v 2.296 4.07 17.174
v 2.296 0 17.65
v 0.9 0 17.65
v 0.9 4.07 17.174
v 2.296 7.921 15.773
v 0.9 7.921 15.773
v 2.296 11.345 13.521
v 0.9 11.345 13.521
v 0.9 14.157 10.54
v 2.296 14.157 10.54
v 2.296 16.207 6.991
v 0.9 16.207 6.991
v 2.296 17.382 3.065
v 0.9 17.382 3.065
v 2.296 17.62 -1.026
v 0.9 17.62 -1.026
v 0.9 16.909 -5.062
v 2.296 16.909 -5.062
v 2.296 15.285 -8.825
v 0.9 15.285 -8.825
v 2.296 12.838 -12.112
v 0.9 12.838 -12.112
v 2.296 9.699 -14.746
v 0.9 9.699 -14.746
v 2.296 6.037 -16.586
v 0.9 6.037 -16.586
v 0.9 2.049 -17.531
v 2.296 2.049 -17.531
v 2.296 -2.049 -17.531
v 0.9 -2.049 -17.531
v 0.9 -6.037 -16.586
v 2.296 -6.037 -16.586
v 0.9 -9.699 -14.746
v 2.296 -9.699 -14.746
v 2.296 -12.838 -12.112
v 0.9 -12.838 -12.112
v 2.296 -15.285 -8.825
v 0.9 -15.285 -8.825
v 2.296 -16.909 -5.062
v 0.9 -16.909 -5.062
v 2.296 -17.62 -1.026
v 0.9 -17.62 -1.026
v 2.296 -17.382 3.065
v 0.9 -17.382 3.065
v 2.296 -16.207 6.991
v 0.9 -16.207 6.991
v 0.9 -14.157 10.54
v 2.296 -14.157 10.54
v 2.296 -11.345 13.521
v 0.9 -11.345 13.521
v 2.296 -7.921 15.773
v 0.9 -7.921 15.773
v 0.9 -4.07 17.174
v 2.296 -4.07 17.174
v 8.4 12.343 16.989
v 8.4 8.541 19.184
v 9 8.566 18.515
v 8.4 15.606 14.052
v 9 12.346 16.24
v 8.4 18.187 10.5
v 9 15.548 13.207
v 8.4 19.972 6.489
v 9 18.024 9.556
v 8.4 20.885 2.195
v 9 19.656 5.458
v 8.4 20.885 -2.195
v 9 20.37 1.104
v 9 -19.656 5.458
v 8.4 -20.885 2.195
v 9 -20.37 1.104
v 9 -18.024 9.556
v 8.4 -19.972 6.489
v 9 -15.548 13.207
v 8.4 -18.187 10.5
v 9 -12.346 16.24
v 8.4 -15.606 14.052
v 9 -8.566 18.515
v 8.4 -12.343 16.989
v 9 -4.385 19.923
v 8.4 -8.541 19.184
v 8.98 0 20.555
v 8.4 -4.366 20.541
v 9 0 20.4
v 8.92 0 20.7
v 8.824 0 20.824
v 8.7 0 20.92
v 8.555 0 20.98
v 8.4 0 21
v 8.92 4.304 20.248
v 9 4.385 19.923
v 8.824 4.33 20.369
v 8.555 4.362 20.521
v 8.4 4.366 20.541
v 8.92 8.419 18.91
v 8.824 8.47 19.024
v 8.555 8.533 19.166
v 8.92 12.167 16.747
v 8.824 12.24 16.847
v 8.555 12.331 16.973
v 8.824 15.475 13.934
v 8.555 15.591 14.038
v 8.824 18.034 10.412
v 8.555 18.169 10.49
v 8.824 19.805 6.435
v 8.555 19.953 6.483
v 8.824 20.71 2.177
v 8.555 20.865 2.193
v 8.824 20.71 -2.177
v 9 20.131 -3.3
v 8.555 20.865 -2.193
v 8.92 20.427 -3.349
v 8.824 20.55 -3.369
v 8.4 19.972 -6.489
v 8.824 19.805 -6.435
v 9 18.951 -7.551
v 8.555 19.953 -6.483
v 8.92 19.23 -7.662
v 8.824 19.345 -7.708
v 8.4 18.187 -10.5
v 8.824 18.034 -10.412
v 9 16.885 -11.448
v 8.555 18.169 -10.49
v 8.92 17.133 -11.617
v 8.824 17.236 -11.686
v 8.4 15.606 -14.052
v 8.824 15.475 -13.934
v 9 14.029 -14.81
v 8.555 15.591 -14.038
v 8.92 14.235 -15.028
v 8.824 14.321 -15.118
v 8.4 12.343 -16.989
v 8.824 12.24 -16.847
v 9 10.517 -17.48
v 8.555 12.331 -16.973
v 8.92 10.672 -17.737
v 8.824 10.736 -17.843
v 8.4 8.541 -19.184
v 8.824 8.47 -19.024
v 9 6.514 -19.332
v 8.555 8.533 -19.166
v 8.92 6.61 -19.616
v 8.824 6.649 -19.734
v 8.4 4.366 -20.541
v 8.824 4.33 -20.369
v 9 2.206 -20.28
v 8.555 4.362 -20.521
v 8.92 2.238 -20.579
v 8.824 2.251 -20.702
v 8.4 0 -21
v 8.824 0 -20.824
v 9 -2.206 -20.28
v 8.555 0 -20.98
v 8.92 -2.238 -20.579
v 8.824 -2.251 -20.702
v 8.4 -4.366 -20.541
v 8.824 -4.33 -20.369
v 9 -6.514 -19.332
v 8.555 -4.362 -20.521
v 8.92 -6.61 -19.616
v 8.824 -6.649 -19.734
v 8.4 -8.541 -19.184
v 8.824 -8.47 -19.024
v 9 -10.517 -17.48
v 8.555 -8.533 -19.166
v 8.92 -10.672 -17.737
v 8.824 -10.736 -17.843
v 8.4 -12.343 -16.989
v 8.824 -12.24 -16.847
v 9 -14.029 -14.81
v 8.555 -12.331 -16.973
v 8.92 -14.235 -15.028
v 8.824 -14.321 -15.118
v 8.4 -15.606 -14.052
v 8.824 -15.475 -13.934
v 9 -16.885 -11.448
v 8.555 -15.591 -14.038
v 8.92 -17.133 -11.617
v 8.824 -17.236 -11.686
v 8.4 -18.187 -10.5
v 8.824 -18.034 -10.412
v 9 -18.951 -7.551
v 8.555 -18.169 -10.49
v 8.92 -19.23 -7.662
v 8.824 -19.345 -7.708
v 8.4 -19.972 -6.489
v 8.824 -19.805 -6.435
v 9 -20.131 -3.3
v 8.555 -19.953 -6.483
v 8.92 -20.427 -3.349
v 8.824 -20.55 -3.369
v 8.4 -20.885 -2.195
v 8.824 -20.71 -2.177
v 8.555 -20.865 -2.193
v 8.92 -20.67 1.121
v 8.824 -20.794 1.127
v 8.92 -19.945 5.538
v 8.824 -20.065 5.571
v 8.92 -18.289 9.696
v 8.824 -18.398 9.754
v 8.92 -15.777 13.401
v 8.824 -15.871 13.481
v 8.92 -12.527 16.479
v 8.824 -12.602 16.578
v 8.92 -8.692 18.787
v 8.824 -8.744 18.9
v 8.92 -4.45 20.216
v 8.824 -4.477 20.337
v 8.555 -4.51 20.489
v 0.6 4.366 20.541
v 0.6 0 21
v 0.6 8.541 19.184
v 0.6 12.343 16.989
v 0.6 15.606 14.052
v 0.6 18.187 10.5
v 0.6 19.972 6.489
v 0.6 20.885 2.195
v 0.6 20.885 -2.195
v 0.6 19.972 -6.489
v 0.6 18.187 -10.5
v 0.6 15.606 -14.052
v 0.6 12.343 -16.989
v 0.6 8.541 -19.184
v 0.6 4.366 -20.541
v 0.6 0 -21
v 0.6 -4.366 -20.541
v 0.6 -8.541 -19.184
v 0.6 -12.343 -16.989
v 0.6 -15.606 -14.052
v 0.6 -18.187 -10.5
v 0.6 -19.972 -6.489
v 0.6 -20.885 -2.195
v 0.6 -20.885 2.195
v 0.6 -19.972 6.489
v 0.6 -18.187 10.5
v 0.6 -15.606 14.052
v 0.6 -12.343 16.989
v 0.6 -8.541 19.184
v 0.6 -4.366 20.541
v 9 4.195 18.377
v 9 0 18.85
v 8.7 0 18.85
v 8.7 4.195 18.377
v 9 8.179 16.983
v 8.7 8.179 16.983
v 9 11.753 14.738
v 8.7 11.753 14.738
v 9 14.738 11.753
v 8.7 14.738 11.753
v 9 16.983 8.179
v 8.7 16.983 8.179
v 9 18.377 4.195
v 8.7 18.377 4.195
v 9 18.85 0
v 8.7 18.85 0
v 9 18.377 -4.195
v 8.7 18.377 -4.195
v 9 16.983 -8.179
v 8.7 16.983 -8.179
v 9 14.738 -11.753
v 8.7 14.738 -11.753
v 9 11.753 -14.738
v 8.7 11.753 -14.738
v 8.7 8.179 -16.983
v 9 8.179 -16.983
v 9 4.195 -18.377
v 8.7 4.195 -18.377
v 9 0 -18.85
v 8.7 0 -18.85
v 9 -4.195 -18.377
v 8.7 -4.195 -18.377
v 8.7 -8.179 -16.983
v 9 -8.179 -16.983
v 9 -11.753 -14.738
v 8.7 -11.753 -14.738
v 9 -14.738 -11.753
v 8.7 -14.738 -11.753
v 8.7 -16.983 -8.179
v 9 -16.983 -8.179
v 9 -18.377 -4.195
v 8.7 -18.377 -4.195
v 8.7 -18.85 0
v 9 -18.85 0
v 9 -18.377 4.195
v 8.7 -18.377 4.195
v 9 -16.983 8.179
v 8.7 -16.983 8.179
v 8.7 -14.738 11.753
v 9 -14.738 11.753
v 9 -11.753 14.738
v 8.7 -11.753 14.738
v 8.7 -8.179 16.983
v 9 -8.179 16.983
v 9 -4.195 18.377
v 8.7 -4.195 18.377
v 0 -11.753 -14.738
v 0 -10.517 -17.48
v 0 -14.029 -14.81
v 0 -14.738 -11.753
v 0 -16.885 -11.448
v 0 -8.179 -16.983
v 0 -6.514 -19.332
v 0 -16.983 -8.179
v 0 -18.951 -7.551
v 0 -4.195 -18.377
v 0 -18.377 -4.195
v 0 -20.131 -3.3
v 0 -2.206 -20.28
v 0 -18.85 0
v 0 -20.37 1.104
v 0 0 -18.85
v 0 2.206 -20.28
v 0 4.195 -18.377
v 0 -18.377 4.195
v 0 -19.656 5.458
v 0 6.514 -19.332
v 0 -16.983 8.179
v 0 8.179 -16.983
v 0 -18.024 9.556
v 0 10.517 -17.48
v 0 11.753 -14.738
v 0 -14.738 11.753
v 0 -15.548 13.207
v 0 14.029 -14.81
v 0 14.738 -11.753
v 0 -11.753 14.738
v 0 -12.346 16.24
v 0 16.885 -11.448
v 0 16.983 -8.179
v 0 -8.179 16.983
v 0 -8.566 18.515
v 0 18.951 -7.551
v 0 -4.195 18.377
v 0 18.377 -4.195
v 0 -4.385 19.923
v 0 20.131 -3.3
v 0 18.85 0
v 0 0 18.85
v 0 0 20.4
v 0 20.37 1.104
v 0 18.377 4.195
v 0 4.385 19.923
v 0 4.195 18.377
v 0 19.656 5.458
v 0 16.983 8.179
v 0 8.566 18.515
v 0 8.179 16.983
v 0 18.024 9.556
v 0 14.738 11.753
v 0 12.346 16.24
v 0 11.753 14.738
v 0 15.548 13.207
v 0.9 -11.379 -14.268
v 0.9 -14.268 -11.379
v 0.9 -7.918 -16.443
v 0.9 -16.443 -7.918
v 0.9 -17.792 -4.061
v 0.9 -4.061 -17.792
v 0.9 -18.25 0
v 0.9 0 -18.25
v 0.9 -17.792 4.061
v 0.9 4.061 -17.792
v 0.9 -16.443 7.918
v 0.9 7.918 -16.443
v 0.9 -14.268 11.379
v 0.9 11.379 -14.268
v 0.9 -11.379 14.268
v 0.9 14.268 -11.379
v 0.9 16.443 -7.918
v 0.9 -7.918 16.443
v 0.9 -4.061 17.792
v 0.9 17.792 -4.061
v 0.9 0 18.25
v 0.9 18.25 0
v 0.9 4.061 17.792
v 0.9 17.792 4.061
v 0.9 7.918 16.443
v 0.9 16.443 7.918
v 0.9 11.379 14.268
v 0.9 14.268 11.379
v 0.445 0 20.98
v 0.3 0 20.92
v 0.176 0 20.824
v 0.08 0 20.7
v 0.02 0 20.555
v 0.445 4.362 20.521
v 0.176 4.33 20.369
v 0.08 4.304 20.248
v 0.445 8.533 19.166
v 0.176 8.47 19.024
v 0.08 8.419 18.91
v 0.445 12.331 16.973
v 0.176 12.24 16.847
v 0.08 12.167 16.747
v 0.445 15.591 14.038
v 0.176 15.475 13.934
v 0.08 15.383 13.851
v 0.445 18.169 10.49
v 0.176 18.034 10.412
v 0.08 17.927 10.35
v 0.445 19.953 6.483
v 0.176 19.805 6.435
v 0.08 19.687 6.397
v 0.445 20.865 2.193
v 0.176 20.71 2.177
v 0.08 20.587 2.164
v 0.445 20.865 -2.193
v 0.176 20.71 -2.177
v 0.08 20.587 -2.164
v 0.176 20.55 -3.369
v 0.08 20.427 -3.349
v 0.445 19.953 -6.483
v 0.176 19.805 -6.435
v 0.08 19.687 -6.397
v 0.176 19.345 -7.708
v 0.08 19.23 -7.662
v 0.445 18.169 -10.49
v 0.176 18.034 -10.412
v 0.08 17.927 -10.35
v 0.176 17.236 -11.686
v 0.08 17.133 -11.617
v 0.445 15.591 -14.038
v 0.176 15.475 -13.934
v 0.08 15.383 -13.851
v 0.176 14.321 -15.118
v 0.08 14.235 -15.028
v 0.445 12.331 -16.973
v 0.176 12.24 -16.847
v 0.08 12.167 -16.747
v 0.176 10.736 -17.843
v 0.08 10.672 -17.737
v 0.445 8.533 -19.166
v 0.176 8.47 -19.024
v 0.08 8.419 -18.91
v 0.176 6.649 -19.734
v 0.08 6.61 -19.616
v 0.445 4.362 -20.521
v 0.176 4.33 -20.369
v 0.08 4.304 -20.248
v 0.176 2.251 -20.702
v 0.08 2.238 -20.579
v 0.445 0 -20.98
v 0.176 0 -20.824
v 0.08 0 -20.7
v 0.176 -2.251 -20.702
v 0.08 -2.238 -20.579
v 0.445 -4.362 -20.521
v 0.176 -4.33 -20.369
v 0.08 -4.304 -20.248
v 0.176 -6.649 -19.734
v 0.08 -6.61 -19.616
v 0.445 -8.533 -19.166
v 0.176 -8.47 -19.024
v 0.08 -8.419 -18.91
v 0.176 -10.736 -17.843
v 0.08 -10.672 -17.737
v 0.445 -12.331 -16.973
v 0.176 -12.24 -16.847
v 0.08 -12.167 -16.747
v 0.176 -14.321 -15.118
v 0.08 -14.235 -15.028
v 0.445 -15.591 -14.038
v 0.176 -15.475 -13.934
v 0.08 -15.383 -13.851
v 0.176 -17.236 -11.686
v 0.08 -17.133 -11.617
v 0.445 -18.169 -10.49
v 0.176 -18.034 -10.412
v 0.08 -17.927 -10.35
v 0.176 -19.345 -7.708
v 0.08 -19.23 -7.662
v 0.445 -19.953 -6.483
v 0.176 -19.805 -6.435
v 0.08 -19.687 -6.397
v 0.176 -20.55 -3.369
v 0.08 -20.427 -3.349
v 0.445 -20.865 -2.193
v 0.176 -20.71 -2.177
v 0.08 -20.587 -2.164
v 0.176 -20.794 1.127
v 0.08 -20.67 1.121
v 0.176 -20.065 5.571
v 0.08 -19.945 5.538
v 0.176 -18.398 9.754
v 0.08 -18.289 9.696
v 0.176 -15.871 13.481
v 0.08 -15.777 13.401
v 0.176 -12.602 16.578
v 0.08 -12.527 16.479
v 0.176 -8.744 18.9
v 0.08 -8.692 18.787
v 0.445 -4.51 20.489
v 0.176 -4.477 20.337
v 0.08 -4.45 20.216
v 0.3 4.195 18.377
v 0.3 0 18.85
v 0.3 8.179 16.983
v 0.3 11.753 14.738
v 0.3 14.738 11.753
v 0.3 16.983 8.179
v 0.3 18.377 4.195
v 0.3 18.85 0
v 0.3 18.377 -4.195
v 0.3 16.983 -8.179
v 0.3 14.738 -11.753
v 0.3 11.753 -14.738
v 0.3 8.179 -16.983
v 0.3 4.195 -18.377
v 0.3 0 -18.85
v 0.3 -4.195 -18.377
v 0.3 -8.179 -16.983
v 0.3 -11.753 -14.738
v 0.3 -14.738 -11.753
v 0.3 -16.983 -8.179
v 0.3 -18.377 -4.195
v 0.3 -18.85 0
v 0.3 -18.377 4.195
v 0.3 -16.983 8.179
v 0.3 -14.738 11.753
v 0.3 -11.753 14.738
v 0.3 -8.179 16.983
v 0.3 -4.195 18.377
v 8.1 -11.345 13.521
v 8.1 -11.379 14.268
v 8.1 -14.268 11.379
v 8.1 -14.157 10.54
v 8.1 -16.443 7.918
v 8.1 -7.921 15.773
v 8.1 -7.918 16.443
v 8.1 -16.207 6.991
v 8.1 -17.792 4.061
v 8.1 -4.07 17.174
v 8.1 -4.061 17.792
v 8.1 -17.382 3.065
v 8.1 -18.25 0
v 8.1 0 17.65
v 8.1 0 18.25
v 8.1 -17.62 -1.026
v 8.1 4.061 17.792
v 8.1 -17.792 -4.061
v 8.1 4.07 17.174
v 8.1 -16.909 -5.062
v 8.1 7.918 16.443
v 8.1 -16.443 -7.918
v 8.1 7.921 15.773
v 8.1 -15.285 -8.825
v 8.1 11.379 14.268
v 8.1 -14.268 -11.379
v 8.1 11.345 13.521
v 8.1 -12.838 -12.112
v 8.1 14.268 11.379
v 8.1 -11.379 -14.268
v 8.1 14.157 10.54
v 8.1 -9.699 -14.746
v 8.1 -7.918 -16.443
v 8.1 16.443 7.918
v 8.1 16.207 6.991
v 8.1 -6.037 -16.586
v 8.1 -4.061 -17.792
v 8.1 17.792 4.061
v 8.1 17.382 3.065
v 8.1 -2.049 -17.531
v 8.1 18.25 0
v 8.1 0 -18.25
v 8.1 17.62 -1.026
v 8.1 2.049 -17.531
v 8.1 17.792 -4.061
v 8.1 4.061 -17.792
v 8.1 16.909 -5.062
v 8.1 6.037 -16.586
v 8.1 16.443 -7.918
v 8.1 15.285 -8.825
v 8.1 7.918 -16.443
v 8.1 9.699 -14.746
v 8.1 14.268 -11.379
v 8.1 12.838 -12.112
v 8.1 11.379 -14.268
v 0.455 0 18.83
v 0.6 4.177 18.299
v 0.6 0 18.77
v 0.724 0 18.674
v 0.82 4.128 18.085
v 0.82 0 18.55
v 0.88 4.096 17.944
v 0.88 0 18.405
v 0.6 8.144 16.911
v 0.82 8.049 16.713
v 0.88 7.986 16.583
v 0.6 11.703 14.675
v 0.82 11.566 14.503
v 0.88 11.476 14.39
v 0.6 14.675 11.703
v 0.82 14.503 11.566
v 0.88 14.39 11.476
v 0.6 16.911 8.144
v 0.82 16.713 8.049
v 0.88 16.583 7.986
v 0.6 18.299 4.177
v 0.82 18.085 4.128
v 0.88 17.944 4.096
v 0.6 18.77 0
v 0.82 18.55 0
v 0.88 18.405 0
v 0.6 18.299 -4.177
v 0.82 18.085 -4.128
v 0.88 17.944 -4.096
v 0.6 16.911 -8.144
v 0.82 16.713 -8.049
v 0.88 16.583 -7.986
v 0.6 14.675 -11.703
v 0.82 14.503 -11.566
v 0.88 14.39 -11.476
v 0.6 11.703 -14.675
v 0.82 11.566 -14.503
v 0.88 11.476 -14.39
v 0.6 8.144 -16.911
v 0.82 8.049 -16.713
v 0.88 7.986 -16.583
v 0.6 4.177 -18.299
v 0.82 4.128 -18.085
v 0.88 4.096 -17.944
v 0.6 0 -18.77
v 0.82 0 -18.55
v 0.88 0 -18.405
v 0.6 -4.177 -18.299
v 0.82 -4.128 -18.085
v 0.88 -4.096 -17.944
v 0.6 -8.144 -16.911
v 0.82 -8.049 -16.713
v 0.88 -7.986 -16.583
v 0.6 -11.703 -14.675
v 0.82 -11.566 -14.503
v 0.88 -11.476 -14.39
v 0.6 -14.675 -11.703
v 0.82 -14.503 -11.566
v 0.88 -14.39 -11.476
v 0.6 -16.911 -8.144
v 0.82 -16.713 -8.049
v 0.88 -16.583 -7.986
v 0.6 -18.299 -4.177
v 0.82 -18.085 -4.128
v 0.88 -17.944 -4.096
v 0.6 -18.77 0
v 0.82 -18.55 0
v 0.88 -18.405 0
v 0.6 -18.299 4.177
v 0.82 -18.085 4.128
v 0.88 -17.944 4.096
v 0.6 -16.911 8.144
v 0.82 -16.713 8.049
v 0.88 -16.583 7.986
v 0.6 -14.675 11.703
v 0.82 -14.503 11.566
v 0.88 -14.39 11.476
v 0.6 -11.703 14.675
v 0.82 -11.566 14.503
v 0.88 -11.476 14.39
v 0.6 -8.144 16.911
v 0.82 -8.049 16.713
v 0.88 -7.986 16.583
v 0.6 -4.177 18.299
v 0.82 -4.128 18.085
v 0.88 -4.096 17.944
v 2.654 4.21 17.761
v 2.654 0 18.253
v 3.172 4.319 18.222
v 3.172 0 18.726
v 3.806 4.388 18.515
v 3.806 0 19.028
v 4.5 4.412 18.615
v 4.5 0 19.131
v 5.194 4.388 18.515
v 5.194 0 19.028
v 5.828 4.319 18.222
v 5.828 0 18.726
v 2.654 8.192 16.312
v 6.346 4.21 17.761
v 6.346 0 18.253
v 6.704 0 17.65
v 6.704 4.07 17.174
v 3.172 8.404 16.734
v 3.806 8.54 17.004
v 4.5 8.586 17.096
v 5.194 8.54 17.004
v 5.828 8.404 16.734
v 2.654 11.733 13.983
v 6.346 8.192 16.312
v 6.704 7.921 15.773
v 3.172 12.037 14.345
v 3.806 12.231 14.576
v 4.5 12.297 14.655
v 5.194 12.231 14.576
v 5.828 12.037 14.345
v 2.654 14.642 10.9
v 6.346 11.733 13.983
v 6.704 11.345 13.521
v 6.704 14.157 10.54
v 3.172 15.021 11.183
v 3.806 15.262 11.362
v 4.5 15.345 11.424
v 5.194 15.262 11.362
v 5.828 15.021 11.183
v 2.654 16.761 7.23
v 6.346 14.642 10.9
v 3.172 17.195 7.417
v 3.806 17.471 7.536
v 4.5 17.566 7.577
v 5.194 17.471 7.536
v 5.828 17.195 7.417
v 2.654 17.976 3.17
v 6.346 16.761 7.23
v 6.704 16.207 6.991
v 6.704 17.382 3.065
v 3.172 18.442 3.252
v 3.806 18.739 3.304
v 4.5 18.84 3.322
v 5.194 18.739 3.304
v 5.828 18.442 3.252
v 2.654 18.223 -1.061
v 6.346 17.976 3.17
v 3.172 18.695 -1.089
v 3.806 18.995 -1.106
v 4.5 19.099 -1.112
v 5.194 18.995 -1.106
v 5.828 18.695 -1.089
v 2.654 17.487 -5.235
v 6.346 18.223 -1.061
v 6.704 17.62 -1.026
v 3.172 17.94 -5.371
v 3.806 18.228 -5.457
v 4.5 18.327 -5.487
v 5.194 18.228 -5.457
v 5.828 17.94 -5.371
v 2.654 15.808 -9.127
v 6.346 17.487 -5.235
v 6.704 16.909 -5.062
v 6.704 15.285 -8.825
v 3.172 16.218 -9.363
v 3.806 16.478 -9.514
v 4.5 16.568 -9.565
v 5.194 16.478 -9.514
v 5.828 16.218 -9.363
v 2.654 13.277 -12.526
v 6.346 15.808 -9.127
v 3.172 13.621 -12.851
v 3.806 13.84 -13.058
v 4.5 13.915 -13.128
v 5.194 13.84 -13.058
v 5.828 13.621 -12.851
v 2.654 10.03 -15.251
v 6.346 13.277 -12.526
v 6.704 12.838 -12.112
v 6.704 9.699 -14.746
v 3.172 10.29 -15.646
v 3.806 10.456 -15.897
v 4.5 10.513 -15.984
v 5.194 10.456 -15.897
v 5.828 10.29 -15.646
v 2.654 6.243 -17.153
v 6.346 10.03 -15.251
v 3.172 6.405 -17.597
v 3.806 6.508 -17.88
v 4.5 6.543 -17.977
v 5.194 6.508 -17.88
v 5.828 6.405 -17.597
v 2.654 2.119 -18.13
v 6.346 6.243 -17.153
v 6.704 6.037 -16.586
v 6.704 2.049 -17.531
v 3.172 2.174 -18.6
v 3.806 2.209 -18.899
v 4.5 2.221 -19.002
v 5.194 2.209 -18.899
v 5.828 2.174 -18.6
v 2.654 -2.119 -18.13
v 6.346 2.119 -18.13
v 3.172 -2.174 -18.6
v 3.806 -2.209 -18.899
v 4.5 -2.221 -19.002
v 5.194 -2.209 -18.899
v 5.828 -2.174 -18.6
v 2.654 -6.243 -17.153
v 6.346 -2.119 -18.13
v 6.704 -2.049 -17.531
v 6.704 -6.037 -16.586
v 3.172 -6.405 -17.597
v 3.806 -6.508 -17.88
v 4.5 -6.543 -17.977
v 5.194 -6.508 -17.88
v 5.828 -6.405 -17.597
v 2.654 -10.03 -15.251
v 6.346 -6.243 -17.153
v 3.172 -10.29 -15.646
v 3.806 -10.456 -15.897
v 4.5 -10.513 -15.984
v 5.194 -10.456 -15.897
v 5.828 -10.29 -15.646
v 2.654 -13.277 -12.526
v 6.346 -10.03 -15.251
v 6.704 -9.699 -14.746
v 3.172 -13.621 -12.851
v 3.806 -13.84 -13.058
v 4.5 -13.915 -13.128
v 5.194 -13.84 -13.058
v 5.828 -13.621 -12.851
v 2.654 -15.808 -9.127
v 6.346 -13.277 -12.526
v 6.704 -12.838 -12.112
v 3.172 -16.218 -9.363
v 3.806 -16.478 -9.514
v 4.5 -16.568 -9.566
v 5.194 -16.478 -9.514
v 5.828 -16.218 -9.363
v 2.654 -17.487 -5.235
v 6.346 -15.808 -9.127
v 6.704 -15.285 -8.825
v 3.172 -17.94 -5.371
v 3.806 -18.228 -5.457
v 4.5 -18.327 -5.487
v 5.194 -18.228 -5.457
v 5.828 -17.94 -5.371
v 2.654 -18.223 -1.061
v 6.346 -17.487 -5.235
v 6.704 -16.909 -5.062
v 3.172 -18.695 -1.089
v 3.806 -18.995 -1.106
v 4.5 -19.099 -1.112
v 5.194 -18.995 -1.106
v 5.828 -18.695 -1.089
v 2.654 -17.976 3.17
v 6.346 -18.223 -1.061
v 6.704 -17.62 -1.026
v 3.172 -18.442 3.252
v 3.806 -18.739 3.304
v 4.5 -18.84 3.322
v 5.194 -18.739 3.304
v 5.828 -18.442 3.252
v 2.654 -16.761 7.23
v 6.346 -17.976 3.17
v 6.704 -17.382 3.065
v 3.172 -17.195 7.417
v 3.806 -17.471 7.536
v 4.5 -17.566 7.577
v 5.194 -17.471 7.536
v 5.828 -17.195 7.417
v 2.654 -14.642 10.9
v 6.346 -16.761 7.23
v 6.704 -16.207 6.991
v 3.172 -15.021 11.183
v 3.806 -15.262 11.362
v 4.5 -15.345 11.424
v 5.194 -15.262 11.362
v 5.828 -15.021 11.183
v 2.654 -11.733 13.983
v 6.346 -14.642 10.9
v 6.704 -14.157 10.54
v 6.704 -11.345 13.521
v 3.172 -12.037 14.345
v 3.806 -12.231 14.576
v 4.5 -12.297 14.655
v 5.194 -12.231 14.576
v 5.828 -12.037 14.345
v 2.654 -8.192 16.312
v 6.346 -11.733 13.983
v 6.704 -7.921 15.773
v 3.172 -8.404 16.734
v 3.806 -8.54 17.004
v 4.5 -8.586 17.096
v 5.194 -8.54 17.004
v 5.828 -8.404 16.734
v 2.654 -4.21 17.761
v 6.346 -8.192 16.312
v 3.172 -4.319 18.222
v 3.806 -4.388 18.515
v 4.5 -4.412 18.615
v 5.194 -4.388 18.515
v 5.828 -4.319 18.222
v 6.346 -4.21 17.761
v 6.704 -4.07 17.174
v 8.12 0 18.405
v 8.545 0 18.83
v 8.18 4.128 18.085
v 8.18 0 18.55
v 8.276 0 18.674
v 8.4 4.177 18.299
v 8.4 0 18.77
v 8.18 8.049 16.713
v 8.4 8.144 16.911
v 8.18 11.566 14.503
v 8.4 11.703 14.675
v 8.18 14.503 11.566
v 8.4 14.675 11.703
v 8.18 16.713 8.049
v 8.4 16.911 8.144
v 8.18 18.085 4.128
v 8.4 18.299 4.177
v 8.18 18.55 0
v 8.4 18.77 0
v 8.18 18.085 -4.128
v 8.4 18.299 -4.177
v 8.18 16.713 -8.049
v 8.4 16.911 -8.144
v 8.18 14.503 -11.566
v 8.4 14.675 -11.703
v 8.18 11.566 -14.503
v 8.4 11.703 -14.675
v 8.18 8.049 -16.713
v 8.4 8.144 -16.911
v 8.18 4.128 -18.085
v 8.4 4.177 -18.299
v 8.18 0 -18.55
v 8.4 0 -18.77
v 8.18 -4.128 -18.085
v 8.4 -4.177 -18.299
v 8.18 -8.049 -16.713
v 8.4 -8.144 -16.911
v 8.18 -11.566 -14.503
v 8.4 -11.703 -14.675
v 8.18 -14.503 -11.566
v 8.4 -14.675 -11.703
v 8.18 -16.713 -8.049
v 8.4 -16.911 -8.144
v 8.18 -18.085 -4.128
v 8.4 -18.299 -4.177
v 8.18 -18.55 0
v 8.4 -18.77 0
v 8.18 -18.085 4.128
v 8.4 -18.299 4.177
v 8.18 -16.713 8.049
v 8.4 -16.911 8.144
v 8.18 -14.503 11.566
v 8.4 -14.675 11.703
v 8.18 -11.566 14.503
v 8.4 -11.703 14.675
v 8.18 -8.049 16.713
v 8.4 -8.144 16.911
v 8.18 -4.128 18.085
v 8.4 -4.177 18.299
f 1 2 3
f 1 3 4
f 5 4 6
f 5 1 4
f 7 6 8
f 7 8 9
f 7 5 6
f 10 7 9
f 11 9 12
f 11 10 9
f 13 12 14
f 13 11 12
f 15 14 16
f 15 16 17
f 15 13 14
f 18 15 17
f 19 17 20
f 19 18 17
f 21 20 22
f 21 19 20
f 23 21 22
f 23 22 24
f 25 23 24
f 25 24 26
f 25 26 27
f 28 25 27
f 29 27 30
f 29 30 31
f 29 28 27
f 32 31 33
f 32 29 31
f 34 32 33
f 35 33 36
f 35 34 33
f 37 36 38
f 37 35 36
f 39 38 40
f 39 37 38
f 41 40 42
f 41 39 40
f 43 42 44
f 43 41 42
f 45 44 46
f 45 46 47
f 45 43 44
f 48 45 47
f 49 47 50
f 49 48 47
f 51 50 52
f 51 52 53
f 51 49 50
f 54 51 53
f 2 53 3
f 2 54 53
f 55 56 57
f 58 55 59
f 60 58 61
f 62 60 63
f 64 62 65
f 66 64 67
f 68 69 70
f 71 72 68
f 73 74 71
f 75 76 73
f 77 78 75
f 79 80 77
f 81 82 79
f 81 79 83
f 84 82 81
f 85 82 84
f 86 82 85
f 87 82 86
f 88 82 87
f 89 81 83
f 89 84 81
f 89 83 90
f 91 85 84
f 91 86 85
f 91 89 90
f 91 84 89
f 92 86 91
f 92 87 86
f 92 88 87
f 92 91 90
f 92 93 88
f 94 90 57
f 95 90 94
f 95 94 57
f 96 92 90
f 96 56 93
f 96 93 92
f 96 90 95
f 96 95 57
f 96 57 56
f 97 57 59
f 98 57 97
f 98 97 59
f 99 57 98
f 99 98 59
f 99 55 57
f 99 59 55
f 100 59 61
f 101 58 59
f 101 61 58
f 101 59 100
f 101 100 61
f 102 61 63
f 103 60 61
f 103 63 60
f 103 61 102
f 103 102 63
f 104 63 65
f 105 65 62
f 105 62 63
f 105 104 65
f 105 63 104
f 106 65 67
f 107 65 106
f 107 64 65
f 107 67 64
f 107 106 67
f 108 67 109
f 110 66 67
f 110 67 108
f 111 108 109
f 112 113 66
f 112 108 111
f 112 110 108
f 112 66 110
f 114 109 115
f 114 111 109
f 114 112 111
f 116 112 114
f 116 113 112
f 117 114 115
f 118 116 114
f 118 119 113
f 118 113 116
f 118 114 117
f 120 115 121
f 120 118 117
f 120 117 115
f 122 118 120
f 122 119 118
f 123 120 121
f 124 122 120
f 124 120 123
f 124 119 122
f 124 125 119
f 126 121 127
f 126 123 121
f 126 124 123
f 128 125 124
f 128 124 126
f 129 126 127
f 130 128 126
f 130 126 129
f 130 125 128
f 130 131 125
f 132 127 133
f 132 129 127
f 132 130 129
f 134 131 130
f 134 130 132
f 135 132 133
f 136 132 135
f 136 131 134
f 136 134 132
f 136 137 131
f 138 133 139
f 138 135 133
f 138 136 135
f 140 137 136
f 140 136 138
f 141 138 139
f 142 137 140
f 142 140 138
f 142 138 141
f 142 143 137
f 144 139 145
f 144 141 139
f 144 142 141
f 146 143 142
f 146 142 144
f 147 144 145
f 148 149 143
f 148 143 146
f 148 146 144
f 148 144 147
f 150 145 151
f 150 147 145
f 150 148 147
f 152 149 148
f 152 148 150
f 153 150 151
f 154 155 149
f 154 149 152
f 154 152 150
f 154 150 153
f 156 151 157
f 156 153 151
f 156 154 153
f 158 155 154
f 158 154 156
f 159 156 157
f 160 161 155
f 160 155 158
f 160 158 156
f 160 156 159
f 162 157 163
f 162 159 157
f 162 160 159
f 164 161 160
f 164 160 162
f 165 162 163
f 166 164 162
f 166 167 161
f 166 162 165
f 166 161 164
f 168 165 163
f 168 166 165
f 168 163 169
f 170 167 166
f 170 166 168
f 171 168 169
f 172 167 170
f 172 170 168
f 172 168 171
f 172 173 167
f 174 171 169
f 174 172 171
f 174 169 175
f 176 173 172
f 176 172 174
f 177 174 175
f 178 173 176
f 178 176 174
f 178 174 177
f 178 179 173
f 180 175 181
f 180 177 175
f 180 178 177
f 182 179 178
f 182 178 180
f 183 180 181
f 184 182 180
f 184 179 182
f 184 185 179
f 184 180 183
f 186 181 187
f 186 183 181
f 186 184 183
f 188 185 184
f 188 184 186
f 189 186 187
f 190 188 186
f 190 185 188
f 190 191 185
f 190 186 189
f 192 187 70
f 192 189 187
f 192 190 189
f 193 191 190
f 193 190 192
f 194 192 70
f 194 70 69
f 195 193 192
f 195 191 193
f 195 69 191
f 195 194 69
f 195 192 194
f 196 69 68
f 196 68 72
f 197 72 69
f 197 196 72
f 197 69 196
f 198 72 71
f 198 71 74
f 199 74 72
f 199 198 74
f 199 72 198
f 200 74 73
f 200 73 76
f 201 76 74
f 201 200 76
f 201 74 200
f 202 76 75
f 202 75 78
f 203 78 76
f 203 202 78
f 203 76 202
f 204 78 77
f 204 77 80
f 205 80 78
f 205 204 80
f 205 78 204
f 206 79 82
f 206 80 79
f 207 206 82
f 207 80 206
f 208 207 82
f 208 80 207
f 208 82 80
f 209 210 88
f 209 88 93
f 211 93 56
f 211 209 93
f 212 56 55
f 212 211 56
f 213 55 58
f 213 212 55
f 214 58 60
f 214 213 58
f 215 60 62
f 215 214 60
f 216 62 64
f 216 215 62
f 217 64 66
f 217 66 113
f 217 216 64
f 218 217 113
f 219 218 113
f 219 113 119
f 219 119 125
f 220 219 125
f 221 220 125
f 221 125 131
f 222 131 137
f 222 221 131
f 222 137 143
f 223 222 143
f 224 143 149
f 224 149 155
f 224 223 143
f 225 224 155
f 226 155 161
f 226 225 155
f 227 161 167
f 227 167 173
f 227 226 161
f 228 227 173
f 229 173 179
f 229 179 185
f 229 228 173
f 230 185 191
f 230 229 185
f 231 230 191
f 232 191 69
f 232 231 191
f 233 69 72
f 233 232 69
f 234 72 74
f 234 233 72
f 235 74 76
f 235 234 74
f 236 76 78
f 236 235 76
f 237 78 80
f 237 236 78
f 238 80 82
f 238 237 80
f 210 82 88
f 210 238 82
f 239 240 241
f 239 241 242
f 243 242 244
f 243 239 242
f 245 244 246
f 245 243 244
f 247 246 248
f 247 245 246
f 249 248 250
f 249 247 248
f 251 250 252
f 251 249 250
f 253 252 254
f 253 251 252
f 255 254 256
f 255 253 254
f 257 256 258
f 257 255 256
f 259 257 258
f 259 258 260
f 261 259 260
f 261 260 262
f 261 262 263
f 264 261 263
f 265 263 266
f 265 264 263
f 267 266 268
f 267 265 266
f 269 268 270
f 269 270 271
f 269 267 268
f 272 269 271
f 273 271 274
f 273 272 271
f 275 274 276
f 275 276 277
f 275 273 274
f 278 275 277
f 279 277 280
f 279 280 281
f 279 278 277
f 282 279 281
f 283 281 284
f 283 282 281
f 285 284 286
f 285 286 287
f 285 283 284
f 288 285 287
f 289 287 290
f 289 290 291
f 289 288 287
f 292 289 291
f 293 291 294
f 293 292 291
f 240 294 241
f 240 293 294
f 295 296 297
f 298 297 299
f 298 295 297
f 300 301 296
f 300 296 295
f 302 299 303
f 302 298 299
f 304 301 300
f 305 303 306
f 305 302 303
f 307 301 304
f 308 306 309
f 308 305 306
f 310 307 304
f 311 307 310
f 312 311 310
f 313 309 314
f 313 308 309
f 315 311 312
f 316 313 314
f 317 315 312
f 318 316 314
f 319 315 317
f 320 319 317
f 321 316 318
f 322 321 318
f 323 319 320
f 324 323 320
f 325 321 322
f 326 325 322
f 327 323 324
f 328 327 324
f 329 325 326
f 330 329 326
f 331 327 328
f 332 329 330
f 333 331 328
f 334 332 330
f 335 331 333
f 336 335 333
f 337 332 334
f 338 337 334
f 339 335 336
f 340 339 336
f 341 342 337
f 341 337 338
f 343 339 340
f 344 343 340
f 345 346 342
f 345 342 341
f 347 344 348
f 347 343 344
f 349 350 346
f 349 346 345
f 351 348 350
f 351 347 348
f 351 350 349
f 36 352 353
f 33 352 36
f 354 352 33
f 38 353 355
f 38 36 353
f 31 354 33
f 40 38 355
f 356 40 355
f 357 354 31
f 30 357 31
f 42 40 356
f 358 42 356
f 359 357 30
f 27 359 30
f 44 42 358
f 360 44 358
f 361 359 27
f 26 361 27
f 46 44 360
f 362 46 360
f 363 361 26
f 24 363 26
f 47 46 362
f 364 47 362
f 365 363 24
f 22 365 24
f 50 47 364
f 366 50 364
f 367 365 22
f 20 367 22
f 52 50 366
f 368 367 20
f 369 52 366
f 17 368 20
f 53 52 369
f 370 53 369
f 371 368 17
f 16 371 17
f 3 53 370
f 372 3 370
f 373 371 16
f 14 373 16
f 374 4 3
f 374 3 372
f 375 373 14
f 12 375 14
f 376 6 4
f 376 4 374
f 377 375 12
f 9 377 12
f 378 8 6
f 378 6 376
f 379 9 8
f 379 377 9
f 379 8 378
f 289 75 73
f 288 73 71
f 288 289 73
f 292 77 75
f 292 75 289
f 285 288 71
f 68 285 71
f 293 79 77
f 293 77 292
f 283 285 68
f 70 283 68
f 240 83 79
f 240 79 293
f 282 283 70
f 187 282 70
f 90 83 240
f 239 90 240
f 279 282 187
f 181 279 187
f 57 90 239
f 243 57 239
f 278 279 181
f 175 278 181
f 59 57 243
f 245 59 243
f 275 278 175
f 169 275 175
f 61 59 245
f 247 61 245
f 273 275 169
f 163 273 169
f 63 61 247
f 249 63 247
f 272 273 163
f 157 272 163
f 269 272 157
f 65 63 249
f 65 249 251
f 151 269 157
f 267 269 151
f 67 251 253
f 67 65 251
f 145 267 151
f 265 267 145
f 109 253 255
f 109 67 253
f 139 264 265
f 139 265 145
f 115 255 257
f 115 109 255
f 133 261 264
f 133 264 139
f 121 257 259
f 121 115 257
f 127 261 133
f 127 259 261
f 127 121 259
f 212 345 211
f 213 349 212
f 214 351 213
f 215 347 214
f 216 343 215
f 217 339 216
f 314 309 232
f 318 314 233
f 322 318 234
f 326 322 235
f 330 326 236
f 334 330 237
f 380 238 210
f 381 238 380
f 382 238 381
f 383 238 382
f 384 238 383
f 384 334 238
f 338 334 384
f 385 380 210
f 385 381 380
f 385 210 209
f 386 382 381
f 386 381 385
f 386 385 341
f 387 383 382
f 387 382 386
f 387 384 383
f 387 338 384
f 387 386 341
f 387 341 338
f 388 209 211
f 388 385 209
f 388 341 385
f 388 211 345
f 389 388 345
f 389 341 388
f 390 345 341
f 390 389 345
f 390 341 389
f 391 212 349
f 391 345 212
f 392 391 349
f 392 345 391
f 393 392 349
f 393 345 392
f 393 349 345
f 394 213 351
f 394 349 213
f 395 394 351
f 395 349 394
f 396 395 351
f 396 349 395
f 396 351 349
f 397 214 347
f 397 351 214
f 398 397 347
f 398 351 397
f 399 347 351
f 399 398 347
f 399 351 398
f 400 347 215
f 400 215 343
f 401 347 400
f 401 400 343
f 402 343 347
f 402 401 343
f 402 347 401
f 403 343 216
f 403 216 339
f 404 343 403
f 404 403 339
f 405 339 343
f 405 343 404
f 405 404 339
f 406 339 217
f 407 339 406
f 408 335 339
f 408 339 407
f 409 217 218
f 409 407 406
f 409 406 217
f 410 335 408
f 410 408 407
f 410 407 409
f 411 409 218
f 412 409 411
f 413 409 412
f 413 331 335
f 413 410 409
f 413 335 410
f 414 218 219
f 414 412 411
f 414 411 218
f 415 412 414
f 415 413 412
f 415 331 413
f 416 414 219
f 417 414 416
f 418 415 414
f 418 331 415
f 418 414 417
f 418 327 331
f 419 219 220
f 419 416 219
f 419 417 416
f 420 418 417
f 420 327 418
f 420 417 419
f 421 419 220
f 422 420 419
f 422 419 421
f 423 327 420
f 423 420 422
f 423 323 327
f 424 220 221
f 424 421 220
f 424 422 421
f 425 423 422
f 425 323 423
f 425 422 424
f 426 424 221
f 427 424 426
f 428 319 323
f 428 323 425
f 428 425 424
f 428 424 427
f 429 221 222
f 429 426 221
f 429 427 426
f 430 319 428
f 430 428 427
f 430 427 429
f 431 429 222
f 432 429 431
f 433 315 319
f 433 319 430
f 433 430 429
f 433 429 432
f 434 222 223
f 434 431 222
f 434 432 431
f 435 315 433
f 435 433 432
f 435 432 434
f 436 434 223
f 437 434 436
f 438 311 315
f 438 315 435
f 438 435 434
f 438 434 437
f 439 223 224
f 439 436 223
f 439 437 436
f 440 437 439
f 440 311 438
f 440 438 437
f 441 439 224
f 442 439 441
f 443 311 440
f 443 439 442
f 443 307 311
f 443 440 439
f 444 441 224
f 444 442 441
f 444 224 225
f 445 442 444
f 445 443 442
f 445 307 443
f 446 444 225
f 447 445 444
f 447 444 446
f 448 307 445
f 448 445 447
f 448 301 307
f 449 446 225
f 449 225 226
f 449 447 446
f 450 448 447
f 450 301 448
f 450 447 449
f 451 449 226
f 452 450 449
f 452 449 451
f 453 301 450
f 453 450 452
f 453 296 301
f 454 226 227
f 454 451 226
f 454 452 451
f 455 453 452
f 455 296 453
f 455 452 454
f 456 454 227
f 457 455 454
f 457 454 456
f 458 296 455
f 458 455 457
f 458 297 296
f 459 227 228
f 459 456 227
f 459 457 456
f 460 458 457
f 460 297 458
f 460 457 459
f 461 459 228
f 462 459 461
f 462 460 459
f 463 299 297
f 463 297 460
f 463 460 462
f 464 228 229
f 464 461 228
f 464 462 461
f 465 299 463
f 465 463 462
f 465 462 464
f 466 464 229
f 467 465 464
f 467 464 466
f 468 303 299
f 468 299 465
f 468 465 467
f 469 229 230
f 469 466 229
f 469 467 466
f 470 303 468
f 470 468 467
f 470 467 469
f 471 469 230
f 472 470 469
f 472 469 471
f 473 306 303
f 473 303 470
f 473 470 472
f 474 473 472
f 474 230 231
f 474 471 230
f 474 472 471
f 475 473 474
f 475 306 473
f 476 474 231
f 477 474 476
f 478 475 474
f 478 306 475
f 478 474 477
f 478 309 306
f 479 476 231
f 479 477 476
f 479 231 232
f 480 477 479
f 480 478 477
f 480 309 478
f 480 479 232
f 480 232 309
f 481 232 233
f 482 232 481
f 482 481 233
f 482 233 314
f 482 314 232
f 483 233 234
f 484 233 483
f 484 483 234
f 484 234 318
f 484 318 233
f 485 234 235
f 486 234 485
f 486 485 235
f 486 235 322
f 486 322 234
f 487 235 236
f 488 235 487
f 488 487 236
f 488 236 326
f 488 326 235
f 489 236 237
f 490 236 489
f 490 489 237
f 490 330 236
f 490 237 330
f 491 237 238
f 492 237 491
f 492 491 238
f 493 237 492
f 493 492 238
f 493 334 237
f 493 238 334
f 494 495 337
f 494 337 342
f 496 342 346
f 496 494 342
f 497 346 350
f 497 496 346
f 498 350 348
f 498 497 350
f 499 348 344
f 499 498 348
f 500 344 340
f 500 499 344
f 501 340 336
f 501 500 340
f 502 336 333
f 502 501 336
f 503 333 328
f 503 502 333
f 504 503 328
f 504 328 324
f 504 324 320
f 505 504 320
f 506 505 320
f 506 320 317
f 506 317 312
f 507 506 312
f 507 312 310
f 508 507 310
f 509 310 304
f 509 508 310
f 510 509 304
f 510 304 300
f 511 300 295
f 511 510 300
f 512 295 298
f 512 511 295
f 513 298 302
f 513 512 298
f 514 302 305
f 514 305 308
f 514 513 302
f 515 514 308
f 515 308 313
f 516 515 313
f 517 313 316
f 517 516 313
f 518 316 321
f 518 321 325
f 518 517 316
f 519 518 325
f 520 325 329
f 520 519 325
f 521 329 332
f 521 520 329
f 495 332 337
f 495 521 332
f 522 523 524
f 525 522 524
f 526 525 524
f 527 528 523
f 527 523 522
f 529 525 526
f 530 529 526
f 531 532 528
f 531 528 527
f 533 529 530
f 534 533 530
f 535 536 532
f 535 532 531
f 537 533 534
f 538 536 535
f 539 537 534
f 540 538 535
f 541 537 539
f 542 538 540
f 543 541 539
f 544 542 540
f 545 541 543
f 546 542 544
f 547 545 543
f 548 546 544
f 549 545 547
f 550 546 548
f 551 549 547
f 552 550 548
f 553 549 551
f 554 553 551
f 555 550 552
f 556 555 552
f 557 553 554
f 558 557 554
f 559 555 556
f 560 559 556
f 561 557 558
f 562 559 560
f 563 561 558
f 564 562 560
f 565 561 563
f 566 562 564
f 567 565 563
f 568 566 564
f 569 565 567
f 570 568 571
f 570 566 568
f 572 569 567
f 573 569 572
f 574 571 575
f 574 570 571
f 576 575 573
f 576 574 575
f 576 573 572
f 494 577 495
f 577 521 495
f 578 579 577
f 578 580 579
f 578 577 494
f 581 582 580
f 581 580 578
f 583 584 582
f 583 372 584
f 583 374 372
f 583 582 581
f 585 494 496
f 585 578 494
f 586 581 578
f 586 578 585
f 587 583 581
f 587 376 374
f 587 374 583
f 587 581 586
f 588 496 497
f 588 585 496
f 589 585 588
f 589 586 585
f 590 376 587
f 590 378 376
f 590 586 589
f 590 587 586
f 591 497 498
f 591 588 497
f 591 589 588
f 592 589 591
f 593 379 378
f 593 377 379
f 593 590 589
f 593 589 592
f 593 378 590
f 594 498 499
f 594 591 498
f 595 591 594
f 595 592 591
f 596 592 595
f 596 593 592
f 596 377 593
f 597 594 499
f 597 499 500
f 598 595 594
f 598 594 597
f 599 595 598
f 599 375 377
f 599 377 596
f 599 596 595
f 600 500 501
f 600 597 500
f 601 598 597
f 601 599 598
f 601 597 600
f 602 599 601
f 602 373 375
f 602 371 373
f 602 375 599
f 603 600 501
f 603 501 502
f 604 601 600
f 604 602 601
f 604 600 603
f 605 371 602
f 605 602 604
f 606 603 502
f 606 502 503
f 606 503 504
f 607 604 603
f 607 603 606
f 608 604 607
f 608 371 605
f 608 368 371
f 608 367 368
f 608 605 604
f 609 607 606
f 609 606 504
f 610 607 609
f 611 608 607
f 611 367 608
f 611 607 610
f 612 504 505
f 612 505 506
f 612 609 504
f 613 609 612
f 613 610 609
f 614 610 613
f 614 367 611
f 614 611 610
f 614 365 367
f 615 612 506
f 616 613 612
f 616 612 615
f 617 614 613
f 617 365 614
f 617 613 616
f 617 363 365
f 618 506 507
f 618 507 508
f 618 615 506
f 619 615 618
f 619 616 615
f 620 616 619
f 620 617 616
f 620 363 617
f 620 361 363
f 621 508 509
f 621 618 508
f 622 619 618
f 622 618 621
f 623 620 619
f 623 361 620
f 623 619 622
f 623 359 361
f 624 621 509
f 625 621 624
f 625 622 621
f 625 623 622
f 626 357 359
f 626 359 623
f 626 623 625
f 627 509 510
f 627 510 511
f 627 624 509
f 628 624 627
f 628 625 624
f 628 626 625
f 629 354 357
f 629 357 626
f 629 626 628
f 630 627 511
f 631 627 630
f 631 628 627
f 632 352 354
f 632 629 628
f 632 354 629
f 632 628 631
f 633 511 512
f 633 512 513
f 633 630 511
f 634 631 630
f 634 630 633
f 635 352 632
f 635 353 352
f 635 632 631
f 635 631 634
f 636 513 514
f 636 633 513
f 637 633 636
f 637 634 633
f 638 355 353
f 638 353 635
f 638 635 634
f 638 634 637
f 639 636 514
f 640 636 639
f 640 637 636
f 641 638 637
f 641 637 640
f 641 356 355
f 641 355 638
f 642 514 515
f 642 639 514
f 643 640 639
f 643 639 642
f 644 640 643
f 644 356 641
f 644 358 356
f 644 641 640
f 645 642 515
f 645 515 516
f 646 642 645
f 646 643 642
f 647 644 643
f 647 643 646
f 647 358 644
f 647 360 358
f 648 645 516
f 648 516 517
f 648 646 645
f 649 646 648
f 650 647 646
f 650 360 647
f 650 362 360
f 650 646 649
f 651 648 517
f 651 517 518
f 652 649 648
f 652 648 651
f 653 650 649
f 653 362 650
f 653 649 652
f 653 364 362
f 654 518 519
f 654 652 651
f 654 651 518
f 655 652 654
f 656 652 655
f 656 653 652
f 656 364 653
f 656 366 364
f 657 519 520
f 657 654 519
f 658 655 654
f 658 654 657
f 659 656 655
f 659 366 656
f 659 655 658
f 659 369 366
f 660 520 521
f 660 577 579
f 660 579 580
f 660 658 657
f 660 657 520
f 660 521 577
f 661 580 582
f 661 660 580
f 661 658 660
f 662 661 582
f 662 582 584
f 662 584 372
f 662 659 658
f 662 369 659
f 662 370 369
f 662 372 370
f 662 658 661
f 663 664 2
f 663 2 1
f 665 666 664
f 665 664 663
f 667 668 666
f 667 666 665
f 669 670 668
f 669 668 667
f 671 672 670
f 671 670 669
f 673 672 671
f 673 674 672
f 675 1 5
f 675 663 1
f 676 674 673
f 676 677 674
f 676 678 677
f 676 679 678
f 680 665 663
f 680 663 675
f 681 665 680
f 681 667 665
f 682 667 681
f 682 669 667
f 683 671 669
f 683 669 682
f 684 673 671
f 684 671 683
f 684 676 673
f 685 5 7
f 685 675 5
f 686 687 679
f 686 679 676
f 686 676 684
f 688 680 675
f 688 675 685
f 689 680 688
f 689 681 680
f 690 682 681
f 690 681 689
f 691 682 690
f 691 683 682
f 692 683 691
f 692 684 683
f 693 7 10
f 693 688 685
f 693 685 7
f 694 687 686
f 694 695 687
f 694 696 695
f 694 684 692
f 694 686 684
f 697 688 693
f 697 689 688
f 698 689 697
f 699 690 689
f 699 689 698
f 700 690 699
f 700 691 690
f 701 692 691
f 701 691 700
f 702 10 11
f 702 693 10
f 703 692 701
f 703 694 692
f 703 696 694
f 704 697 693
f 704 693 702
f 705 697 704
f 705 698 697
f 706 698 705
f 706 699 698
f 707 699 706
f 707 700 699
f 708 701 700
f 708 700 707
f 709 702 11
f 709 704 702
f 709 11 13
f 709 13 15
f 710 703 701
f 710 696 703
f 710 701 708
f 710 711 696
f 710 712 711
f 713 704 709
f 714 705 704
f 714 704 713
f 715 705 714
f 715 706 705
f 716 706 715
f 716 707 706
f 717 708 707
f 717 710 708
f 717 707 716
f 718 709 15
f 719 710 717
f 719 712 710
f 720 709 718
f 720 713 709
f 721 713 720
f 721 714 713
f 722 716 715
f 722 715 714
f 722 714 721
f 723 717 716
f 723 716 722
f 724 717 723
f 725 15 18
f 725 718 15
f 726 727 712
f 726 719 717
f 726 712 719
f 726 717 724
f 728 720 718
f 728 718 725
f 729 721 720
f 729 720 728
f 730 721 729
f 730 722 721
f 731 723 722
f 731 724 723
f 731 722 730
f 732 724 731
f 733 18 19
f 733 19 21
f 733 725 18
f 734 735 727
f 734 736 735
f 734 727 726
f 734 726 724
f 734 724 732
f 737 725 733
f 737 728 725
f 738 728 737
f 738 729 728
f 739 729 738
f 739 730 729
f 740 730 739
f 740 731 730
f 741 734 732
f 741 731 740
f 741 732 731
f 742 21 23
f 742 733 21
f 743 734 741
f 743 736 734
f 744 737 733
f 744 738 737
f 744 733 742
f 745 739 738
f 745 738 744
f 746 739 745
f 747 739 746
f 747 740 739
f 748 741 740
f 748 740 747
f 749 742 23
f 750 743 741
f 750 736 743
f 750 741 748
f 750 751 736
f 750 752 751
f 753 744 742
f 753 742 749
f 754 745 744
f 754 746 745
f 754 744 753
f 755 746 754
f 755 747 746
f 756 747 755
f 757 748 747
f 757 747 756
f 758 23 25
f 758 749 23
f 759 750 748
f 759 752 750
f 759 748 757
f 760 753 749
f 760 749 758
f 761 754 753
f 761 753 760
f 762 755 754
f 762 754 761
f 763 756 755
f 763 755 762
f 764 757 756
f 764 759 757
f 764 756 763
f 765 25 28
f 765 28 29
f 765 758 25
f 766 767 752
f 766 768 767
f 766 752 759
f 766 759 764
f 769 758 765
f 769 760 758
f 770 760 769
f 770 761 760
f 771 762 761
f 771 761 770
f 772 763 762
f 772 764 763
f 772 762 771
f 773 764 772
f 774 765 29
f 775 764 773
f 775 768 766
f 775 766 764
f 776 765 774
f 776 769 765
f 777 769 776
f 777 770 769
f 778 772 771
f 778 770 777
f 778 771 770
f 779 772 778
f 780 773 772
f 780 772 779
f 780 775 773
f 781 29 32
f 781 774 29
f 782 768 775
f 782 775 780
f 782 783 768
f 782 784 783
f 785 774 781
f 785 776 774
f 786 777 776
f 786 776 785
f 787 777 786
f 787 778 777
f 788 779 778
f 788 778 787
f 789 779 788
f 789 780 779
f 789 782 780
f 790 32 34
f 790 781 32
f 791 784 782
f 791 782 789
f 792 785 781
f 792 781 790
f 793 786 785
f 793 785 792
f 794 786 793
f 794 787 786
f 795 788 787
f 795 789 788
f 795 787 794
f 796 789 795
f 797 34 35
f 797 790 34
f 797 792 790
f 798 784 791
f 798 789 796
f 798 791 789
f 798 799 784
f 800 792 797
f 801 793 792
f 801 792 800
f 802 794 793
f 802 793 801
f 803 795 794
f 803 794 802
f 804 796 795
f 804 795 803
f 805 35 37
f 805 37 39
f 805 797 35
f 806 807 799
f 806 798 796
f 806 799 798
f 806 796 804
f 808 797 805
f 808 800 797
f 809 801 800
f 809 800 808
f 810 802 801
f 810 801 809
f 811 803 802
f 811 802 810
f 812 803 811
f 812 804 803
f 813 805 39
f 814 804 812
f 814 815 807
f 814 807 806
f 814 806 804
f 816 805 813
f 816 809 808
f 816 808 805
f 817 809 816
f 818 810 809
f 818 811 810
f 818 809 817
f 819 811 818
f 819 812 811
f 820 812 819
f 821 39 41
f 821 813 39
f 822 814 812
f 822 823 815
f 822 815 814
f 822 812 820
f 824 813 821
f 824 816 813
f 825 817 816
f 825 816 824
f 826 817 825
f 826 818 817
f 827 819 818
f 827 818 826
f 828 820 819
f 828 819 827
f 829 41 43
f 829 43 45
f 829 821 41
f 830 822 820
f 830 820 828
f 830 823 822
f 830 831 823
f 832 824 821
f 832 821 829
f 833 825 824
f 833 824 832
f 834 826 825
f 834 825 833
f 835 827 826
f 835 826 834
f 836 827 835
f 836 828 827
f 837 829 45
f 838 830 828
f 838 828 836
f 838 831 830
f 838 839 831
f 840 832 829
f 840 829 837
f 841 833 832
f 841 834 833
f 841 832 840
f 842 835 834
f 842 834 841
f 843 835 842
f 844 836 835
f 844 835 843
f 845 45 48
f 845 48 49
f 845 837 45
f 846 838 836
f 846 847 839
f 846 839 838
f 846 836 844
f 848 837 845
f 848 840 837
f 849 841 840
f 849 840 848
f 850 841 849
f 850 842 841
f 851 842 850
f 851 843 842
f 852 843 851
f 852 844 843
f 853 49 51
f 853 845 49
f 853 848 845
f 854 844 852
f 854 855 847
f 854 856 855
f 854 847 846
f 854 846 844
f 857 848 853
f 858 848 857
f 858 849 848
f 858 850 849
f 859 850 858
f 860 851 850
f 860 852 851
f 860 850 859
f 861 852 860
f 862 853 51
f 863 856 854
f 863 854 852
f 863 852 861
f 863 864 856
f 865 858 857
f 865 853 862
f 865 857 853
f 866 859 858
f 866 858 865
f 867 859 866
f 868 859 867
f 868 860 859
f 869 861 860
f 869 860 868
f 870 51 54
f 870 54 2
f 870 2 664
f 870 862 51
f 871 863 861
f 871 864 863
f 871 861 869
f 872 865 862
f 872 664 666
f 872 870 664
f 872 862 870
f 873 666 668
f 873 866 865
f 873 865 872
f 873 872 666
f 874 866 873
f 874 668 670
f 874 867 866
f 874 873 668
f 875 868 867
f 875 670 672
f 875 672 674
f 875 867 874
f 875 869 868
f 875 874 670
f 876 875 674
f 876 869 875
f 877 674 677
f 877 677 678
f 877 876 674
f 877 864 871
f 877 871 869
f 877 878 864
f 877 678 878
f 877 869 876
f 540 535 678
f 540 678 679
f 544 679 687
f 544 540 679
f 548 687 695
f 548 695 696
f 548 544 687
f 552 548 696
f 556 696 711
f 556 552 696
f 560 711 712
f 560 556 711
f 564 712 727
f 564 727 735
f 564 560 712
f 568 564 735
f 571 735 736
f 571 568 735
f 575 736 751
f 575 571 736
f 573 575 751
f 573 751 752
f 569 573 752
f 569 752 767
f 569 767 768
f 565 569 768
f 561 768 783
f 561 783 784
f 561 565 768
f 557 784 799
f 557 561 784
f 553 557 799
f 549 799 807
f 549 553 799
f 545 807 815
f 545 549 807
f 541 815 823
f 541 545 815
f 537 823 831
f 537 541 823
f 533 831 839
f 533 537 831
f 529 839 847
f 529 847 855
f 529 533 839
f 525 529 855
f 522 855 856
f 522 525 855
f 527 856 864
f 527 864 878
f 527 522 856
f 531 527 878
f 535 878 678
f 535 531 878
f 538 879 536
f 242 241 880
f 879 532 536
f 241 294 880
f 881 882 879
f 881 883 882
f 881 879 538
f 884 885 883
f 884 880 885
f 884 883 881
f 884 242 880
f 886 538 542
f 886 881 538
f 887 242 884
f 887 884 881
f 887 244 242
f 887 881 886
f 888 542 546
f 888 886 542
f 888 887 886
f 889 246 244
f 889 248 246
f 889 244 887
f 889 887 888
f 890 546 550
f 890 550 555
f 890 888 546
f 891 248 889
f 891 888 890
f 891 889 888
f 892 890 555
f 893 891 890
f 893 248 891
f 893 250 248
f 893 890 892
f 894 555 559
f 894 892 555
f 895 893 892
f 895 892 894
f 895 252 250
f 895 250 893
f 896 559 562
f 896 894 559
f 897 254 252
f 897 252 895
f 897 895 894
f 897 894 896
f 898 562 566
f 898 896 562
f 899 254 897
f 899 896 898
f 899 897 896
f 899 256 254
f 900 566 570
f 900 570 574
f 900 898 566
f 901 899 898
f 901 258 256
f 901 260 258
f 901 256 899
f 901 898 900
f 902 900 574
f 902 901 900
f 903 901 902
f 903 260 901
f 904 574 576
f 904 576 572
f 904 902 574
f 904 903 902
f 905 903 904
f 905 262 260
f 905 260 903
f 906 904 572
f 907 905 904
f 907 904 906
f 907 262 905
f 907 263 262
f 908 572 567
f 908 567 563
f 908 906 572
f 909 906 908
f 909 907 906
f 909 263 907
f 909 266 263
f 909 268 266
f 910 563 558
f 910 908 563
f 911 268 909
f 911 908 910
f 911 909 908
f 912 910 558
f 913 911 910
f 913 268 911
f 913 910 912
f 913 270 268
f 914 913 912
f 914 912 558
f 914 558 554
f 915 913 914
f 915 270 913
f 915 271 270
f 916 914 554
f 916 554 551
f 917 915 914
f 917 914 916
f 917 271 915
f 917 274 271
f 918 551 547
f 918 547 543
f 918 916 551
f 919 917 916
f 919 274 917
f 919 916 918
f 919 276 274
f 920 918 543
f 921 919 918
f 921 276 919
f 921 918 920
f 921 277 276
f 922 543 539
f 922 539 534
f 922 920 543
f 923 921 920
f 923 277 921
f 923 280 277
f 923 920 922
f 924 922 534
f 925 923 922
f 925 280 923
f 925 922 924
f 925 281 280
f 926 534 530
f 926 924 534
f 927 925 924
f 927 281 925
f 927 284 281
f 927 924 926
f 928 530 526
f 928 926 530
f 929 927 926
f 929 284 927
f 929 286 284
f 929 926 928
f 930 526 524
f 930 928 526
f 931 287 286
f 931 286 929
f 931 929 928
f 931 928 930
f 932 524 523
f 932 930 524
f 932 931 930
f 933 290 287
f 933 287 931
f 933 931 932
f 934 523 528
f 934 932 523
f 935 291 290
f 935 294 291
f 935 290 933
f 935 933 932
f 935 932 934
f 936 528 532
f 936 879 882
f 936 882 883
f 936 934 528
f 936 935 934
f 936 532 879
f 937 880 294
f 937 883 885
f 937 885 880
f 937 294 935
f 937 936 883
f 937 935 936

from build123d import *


with BuildPart() as part:
    # Sketch1 → Revolve1 (revolve)
    with BuildSketch(Plane.XY, mode=Mode.PRIVATE) as revolve1_sk:
        with BuildLine():
            Line((0, 20.4), (0, 18.85))
            Line((0, 18.85), (0.3, 18.85))
            ThreePointArc((0.3, 18.85), (0.724264069, 18.674264069), (0.9, 18.25))
            Line((0.9, 18.25), (0.9, 17.65))
            Line((0.9, 17.65), (2.295649529, 17.65))
            ThreePointArc((2.295649529, 17.65), (4.5, 19.131), (6.704350471, 17.65))
            Line((6.704350471, 17.65), (8.1, 17.65))
            Line((8.1, 17.65), (8.1, 18.25))
            ThreePointArc((8.1, 18.25), (8.275735931, 18.674264069), (8.7, 18.85))
            Line((8.7, 18.85), (9, 18.85))
            Line((9, 18.85), (9, 20.4))
            ThreePointArc((9, 20.4), (8.824264069, 20.824264069), (8.4, 21))
            Line((8.4, 21), (0.6, 21))
            ThreePointArc((0.6, 21), (0.175735931, 20.824264069), (0, 20.4))
        make_face()
    revolve(revolve1_sk.sketch.rotate(Axis((50, 0, 0), (-1, 0, 0)), 270), axis=Axis((50, 0, 0), (-1, 0, 0)))

    # Sketch2 → Revolve2 (revolve)
    with BuildSketch(Plane.XY, mode=Mode.PRIVATE) as revolve2_sk:
        with BuildLine():
            Line((0, 20.4), (0, 18.85))
            Line((0, 18.85), (0.3, 18.85))
            ThreePointArc((0.3, 18.85), (0.724264069, 18.674264069), (0.9, 18.25))
            Line((0.9, 18.25), (0.9, 17.65))
            Line((0.9, 17.65), (2.295649529, 17.65))
            ThreePointArc((2.295649529, 17.65), (4.5, 19.131), (6.704350471, 17.65))
            Line((6.704350471, 17.65), (8.1, 17.65))
            Line((8.1, 17.65), (8.1, 18.25))
            ThreePointArc((8.1, 18.25), (8.275735931, 18.674264069), (8.7, 18.85))
            Line((8.7, 18.85), (9, 18.85))
            Line((9, 18.85), (9, 20.4))
            ThreePointArc((9, 20.4), (8.824264069, 20.824264069), (8.4, 21))
            Line((8.4, 21), (0.6, 21))
            ThreePointArc((0.6, 21), (0.175735931, 20.824264069), (0, 20.4))
        make_face()
    revolve(revolve2_sk.sketch.rotate(Axis((50, 0, 0), (-1, 0, 0)), 270), axis=Axis((50, 0, 0), (-1, 0, 0)))


solid = part.part
